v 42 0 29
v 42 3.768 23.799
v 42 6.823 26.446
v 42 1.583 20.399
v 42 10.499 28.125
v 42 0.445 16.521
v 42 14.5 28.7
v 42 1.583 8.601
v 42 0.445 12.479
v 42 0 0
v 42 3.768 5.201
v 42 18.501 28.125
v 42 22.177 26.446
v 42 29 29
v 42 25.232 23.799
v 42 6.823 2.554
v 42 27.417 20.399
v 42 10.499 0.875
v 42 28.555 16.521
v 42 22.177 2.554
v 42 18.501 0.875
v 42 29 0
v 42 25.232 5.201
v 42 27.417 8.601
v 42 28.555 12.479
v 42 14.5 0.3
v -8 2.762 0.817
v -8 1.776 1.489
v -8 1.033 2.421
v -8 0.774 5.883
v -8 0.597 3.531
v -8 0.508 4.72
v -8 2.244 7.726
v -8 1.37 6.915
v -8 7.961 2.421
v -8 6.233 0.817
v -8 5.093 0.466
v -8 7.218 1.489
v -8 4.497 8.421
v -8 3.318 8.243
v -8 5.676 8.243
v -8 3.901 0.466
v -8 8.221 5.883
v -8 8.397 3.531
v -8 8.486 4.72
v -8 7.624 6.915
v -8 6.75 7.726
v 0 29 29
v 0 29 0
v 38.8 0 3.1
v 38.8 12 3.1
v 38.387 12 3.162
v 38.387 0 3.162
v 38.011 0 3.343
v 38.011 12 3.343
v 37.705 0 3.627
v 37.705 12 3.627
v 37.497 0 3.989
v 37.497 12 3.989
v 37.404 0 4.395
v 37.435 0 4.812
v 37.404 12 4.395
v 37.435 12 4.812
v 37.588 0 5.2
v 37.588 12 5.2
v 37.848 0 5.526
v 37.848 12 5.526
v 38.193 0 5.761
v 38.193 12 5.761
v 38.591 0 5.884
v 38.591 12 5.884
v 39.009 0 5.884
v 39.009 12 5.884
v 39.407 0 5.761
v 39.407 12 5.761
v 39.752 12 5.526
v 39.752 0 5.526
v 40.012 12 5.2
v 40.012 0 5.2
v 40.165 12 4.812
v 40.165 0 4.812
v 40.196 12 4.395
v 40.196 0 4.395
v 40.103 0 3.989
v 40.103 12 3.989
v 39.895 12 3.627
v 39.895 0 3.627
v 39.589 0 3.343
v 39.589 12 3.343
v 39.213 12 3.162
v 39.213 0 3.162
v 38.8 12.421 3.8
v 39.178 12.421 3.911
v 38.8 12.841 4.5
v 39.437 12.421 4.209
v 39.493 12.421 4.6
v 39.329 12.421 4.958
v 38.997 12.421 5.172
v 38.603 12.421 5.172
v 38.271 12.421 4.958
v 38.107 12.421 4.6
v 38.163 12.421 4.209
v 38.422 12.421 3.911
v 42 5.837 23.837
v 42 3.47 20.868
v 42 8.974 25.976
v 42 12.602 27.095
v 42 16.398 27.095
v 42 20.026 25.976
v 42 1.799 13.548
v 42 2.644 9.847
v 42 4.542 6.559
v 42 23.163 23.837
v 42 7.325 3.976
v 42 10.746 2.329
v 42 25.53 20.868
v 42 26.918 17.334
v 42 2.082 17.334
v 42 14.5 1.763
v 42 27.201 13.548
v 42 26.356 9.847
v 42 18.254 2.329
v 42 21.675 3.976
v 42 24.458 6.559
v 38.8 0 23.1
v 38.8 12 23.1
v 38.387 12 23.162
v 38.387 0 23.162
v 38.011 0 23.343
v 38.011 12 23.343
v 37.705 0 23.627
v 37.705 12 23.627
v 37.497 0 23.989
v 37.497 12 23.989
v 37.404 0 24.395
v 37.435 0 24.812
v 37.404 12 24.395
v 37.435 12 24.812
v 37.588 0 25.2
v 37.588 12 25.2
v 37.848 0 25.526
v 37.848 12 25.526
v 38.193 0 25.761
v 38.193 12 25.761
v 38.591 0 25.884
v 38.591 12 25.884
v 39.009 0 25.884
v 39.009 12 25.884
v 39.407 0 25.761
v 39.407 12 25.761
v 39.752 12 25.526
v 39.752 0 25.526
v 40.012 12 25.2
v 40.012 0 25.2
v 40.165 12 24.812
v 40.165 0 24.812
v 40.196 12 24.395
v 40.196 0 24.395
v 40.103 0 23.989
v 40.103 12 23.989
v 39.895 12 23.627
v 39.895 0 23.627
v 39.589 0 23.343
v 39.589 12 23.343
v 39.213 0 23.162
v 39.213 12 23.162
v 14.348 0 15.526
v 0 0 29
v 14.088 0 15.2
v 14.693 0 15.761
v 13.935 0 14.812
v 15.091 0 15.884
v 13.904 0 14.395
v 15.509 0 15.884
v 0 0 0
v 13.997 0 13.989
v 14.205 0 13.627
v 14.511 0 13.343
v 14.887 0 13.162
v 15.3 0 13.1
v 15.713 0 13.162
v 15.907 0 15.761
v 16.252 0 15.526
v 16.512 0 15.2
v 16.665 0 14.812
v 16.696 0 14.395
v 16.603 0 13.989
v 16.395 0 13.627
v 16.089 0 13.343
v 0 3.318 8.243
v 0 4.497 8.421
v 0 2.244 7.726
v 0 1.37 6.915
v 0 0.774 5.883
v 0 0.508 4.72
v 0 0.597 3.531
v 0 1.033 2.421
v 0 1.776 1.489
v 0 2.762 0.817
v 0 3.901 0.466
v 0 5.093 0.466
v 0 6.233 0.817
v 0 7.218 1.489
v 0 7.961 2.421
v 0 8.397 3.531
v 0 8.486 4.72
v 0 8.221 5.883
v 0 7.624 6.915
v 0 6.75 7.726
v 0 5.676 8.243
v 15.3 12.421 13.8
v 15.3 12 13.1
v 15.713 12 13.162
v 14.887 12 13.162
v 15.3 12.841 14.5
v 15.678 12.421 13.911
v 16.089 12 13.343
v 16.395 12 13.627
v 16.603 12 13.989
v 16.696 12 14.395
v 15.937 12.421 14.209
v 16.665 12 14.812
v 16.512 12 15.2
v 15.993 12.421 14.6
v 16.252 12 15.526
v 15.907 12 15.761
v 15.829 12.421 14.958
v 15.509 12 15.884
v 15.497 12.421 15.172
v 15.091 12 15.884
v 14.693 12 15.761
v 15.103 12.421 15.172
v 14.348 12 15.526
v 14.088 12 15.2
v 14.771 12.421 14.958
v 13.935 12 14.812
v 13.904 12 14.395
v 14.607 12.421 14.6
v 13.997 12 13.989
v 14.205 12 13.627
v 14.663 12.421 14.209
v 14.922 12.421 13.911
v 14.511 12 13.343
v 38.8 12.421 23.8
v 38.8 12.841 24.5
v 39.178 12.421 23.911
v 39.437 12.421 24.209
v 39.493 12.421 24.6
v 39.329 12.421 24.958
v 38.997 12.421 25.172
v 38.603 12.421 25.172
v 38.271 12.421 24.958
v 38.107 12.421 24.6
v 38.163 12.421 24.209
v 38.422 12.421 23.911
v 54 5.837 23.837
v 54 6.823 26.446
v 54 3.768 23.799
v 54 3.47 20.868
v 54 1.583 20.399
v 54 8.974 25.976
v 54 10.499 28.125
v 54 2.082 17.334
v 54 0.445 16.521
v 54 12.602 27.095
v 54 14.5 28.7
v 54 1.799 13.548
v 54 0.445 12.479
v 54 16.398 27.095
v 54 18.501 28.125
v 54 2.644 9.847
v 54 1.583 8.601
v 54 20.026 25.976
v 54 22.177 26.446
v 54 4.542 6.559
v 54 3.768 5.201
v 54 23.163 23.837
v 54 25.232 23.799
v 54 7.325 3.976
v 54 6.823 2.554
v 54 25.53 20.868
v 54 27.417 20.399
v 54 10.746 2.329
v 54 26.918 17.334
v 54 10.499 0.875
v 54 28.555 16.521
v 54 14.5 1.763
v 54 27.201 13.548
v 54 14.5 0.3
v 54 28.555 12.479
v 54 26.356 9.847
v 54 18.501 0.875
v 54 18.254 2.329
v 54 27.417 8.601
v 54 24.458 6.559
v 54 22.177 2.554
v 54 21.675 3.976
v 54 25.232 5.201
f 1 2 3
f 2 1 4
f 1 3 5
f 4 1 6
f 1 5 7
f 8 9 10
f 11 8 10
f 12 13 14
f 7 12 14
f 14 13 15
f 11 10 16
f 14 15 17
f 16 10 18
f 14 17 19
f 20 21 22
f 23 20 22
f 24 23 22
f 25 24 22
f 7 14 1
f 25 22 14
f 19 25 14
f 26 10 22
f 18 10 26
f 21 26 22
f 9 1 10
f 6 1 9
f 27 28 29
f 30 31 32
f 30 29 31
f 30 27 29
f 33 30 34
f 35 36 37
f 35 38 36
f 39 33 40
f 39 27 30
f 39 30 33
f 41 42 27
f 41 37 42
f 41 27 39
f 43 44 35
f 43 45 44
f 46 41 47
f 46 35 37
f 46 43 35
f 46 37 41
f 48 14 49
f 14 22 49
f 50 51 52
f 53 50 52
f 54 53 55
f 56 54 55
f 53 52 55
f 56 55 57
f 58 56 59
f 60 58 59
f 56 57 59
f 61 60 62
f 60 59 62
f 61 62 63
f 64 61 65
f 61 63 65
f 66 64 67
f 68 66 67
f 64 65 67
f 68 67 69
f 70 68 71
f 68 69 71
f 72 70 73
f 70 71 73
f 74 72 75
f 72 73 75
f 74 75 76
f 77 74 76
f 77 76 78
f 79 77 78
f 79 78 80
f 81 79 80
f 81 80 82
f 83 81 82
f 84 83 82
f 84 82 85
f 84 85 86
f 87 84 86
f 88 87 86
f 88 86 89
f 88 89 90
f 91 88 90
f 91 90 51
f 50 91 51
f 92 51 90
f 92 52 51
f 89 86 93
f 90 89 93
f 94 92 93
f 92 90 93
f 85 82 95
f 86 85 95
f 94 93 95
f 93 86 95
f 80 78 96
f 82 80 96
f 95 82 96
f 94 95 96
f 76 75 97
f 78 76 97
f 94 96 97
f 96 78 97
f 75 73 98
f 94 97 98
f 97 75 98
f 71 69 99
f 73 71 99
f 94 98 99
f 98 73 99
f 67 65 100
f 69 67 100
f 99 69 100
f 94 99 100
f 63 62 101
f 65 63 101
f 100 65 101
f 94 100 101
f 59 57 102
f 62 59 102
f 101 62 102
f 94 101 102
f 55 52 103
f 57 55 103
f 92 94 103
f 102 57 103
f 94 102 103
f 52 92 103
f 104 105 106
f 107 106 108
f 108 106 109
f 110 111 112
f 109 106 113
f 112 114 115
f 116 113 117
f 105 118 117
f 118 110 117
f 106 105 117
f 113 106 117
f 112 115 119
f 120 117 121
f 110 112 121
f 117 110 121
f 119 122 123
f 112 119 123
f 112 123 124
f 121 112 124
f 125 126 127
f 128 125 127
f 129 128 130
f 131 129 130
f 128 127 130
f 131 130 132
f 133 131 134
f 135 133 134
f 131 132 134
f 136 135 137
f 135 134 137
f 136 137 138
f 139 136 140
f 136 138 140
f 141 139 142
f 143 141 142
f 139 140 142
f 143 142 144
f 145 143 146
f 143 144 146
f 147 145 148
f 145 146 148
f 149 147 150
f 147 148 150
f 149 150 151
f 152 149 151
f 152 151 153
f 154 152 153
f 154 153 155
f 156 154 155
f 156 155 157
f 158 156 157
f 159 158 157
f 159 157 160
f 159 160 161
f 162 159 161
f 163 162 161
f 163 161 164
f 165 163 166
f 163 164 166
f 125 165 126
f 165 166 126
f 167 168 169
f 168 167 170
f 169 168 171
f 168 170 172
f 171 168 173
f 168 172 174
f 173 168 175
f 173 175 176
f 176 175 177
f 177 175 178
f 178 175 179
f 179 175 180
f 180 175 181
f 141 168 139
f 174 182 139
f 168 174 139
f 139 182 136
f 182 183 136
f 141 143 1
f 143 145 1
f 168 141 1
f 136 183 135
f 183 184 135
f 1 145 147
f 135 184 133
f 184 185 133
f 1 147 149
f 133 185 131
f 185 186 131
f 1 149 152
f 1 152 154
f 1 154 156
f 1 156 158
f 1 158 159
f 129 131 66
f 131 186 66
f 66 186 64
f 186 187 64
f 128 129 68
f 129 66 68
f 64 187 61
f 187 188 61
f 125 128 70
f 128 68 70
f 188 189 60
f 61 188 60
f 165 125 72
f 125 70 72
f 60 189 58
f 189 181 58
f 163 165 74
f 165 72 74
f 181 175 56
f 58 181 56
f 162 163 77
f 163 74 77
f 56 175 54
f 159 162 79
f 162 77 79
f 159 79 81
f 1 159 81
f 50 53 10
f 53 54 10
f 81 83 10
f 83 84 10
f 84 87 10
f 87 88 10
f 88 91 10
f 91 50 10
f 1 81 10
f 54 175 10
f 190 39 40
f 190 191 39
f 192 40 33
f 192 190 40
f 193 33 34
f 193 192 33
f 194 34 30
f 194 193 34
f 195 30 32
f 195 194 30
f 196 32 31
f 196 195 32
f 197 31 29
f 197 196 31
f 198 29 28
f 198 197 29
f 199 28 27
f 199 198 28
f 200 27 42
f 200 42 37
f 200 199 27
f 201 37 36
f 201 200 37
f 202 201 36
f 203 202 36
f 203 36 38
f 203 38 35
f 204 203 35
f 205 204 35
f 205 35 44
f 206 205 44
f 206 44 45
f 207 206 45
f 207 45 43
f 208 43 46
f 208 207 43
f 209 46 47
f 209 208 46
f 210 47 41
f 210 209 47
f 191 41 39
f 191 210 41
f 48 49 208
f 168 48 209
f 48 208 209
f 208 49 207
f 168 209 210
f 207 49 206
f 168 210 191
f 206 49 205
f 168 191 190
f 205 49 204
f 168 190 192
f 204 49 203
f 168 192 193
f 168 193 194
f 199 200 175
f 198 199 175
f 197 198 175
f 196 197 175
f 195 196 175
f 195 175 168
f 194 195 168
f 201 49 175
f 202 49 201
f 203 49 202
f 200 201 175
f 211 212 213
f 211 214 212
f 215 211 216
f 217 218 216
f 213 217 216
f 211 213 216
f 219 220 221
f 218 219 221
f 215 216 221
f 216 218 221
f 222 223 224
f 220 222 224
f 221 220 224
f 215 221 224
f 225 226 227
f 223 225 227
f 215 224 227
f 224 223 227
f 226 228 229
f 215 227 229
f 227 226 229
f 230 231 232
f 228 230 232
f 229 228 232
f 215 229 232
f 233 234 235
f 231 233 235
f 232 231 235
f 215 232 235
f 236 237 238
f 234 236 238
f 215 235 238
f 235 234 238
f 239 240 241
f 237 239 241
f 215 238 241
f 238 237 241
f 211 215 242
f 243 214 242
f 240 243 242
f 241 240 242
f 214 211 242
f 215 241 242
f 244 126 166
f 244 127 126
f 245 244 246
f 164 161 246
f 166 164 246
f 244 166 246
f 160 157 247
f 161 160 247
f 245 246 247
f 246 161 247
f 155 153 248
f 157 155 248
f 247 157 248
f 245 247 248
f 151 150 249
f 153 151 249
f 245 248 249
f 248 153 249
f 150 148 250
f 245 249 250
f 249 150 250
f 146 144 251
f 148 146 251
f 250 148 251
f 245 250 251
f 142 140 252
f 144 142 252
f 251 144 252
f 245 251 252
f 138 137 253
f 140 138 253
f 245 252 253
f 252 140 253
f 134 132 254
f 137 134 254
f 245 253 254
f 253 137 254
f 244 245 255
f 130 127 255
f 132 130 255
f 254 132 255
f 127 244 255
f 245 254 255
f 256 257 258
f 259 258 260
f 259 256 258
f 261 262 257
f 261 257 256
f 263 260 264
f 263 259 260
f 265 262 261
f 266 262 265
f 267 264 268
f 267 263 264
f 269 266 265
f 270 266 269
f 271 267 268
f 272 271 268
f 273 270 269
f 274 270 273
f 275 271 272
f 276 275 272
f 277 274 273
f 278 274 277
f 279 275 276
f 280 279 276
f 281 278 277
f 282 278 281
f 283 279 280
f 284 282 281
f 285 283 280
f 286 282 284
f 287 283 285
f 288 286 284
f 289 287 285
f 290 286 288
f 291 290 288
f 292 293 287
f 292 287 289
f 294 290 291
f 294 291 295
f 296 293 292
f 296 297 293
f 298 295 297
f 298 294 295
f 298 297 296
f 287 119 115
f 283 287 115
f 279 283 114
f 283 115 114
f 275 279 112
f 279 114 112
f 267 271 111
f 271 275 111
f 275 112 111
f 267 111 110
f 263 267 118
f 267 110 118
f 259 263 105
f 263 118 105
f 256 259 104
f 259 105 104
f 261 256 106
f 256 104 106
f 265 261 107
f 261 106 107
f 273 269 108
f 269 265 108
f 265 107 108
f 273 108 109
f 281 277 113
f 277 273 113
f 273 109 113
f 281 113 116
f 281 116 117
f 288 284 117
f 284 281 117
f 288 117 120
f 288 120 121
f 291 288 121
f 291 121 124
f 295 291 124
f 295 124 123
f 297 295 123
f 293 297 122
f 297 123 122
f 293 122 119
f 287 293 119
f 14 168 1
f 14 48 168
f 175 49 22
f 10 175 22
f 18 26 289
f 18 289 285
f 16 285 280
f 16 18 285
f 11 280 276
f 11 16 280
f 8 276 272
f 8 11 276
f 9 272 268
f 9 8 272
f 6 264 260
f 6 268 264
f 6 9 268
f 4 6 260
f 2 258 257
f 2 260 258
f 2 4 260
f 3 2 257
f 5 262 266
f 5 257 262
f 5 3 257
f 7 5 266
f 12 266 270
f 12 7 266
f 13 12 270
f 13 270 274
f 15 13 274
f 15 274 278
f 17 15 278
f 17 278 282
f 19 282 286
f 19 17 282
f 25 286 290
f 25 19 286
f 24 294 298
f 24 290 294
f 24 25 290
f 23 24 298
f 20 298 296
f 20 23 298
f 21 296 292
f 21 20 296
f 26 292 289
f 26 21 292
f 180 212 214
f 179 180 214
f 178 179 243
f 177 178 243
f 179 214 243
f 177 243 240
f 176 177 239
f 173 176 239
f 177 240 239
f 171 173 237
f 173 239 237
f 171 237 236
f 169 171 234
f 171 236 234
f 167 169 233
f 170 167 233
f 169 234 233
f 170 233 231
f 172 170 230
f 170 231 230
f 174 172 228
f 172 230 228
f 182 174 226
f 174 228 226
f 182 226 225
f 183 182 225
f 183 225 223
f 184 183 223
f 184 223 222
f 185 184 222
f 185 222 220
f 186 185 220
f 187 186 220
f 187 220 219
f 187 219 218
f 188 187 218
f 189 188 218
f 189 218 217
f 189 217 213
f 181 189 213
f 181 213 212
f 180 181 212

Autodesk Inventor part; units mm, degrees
ref_plane "YZ Plane" through (0, 0, 0) normal (1, 0, 0) x (0, 1, 0)
ref_plane "XZ Plane" through (0, 0, 0) normal (0, 1, 0) x (-1, 0, 0)
ref_plane "XY Plane" through (0, 0, 0) normal (0, 0, 1) x (1, 0, 0)
sketch "Sketch1" plane through (0, 0, 0) normal (0, 0, 1) x (1, 0, 0)
  line L0 (0, 0) -> (42, 0)
  line L1 (42, 0) -> (42, 29)
  line L2 (42, 29) -> (0, 29)
  line L3 (0, 29) -> (0, 0)
  dimension "d0" = 42
  dimension "d1" = 29
extrude "Extrusion1" add sketch "Sketch1" along normal blind 29
sketch "Sketch2" plane through (42, 0, 0) normal (1, 0, 0) x (0, 0, -1)
  line L0 (0, 0) -> (0, 29) projected
  line L1 (0, 29) -> (-29, 29) projected
  line L2 (-29, 0) -> (-29, 29) projected
  line L3 (0, 0) -> (-29, 0) projected
  circle A0 centre (-14.5, 14.5) radius 14.2
  circle A1 centre (-14.5, 14.5) radius 12.7369
  dimension "d4" = 28.4
extrude "Extrusion2" add sketch "Sketch2" along normal blind 12 contours A0
sketch "Sketch3" plane through (0, 0, 0) normal (-1, 0, 0) x (0, 0, 1)
  line L0 (0, 29) -> (0, 0) projected
  line L1 (0, 0) -> (29, 0) projected
  line L2 (29, 29) -> (29, 0) projected
  line L3 (0, 29) -> (29, 29) projected
  circle A0 centre (14.5, 14.5) radius 14.2 projected
  circle A1 centre (4.4212, 4.4971) radius 4
  dimension "d7" = 8
extrude "Extrusion3" add sketch "Sketch3" along normal blind 8 contours A1 A0 | A0 A1 picked at (5.4383, 5.4228) picked at (3.5046, 3.5874)
sketch "Sketch4" plane through (0, 0, 0) normal (0, -1, 0) x (1, 0, 0)
  line L0 (0, 0) -> (42, 0) projected
  line L1 (42, 0) -> (42, 29) projected
  line L2 (0, 29) -> (42, 29) projected
  line L3 (0, 0) -> (0, 29) projected
  line L4 (54, 0.3) -> (54, 28.7) projected
  line L5 (42, 28.7) -> (42, 0.3) projected
  line L6 (54, 14.5) -> (0, 14.5) construction
  line L7 (0, 0) -> (0, 29) construction
  point P0 (38.8, 4.5)
  point P1 (38.8, 24.5)
  point P2 (15.3, 14.5)
  dimension "d10" = 10
  dimension "d11" = 14.5
  dimension "d12" = 3.2
  dimension "d13" = 10
  dimension "d14" = 3.2
  dimension "d15" = 23.5
hole "Hole1" at (38.8, 0, 4.5) at (38.8, 0, 24.5) at (15.3, 0, 14.5) direction (0, 1, 0) diameter 2.8 depth 12 tip angle 118
properties part number "00_Basler_acA1920_25gm"
